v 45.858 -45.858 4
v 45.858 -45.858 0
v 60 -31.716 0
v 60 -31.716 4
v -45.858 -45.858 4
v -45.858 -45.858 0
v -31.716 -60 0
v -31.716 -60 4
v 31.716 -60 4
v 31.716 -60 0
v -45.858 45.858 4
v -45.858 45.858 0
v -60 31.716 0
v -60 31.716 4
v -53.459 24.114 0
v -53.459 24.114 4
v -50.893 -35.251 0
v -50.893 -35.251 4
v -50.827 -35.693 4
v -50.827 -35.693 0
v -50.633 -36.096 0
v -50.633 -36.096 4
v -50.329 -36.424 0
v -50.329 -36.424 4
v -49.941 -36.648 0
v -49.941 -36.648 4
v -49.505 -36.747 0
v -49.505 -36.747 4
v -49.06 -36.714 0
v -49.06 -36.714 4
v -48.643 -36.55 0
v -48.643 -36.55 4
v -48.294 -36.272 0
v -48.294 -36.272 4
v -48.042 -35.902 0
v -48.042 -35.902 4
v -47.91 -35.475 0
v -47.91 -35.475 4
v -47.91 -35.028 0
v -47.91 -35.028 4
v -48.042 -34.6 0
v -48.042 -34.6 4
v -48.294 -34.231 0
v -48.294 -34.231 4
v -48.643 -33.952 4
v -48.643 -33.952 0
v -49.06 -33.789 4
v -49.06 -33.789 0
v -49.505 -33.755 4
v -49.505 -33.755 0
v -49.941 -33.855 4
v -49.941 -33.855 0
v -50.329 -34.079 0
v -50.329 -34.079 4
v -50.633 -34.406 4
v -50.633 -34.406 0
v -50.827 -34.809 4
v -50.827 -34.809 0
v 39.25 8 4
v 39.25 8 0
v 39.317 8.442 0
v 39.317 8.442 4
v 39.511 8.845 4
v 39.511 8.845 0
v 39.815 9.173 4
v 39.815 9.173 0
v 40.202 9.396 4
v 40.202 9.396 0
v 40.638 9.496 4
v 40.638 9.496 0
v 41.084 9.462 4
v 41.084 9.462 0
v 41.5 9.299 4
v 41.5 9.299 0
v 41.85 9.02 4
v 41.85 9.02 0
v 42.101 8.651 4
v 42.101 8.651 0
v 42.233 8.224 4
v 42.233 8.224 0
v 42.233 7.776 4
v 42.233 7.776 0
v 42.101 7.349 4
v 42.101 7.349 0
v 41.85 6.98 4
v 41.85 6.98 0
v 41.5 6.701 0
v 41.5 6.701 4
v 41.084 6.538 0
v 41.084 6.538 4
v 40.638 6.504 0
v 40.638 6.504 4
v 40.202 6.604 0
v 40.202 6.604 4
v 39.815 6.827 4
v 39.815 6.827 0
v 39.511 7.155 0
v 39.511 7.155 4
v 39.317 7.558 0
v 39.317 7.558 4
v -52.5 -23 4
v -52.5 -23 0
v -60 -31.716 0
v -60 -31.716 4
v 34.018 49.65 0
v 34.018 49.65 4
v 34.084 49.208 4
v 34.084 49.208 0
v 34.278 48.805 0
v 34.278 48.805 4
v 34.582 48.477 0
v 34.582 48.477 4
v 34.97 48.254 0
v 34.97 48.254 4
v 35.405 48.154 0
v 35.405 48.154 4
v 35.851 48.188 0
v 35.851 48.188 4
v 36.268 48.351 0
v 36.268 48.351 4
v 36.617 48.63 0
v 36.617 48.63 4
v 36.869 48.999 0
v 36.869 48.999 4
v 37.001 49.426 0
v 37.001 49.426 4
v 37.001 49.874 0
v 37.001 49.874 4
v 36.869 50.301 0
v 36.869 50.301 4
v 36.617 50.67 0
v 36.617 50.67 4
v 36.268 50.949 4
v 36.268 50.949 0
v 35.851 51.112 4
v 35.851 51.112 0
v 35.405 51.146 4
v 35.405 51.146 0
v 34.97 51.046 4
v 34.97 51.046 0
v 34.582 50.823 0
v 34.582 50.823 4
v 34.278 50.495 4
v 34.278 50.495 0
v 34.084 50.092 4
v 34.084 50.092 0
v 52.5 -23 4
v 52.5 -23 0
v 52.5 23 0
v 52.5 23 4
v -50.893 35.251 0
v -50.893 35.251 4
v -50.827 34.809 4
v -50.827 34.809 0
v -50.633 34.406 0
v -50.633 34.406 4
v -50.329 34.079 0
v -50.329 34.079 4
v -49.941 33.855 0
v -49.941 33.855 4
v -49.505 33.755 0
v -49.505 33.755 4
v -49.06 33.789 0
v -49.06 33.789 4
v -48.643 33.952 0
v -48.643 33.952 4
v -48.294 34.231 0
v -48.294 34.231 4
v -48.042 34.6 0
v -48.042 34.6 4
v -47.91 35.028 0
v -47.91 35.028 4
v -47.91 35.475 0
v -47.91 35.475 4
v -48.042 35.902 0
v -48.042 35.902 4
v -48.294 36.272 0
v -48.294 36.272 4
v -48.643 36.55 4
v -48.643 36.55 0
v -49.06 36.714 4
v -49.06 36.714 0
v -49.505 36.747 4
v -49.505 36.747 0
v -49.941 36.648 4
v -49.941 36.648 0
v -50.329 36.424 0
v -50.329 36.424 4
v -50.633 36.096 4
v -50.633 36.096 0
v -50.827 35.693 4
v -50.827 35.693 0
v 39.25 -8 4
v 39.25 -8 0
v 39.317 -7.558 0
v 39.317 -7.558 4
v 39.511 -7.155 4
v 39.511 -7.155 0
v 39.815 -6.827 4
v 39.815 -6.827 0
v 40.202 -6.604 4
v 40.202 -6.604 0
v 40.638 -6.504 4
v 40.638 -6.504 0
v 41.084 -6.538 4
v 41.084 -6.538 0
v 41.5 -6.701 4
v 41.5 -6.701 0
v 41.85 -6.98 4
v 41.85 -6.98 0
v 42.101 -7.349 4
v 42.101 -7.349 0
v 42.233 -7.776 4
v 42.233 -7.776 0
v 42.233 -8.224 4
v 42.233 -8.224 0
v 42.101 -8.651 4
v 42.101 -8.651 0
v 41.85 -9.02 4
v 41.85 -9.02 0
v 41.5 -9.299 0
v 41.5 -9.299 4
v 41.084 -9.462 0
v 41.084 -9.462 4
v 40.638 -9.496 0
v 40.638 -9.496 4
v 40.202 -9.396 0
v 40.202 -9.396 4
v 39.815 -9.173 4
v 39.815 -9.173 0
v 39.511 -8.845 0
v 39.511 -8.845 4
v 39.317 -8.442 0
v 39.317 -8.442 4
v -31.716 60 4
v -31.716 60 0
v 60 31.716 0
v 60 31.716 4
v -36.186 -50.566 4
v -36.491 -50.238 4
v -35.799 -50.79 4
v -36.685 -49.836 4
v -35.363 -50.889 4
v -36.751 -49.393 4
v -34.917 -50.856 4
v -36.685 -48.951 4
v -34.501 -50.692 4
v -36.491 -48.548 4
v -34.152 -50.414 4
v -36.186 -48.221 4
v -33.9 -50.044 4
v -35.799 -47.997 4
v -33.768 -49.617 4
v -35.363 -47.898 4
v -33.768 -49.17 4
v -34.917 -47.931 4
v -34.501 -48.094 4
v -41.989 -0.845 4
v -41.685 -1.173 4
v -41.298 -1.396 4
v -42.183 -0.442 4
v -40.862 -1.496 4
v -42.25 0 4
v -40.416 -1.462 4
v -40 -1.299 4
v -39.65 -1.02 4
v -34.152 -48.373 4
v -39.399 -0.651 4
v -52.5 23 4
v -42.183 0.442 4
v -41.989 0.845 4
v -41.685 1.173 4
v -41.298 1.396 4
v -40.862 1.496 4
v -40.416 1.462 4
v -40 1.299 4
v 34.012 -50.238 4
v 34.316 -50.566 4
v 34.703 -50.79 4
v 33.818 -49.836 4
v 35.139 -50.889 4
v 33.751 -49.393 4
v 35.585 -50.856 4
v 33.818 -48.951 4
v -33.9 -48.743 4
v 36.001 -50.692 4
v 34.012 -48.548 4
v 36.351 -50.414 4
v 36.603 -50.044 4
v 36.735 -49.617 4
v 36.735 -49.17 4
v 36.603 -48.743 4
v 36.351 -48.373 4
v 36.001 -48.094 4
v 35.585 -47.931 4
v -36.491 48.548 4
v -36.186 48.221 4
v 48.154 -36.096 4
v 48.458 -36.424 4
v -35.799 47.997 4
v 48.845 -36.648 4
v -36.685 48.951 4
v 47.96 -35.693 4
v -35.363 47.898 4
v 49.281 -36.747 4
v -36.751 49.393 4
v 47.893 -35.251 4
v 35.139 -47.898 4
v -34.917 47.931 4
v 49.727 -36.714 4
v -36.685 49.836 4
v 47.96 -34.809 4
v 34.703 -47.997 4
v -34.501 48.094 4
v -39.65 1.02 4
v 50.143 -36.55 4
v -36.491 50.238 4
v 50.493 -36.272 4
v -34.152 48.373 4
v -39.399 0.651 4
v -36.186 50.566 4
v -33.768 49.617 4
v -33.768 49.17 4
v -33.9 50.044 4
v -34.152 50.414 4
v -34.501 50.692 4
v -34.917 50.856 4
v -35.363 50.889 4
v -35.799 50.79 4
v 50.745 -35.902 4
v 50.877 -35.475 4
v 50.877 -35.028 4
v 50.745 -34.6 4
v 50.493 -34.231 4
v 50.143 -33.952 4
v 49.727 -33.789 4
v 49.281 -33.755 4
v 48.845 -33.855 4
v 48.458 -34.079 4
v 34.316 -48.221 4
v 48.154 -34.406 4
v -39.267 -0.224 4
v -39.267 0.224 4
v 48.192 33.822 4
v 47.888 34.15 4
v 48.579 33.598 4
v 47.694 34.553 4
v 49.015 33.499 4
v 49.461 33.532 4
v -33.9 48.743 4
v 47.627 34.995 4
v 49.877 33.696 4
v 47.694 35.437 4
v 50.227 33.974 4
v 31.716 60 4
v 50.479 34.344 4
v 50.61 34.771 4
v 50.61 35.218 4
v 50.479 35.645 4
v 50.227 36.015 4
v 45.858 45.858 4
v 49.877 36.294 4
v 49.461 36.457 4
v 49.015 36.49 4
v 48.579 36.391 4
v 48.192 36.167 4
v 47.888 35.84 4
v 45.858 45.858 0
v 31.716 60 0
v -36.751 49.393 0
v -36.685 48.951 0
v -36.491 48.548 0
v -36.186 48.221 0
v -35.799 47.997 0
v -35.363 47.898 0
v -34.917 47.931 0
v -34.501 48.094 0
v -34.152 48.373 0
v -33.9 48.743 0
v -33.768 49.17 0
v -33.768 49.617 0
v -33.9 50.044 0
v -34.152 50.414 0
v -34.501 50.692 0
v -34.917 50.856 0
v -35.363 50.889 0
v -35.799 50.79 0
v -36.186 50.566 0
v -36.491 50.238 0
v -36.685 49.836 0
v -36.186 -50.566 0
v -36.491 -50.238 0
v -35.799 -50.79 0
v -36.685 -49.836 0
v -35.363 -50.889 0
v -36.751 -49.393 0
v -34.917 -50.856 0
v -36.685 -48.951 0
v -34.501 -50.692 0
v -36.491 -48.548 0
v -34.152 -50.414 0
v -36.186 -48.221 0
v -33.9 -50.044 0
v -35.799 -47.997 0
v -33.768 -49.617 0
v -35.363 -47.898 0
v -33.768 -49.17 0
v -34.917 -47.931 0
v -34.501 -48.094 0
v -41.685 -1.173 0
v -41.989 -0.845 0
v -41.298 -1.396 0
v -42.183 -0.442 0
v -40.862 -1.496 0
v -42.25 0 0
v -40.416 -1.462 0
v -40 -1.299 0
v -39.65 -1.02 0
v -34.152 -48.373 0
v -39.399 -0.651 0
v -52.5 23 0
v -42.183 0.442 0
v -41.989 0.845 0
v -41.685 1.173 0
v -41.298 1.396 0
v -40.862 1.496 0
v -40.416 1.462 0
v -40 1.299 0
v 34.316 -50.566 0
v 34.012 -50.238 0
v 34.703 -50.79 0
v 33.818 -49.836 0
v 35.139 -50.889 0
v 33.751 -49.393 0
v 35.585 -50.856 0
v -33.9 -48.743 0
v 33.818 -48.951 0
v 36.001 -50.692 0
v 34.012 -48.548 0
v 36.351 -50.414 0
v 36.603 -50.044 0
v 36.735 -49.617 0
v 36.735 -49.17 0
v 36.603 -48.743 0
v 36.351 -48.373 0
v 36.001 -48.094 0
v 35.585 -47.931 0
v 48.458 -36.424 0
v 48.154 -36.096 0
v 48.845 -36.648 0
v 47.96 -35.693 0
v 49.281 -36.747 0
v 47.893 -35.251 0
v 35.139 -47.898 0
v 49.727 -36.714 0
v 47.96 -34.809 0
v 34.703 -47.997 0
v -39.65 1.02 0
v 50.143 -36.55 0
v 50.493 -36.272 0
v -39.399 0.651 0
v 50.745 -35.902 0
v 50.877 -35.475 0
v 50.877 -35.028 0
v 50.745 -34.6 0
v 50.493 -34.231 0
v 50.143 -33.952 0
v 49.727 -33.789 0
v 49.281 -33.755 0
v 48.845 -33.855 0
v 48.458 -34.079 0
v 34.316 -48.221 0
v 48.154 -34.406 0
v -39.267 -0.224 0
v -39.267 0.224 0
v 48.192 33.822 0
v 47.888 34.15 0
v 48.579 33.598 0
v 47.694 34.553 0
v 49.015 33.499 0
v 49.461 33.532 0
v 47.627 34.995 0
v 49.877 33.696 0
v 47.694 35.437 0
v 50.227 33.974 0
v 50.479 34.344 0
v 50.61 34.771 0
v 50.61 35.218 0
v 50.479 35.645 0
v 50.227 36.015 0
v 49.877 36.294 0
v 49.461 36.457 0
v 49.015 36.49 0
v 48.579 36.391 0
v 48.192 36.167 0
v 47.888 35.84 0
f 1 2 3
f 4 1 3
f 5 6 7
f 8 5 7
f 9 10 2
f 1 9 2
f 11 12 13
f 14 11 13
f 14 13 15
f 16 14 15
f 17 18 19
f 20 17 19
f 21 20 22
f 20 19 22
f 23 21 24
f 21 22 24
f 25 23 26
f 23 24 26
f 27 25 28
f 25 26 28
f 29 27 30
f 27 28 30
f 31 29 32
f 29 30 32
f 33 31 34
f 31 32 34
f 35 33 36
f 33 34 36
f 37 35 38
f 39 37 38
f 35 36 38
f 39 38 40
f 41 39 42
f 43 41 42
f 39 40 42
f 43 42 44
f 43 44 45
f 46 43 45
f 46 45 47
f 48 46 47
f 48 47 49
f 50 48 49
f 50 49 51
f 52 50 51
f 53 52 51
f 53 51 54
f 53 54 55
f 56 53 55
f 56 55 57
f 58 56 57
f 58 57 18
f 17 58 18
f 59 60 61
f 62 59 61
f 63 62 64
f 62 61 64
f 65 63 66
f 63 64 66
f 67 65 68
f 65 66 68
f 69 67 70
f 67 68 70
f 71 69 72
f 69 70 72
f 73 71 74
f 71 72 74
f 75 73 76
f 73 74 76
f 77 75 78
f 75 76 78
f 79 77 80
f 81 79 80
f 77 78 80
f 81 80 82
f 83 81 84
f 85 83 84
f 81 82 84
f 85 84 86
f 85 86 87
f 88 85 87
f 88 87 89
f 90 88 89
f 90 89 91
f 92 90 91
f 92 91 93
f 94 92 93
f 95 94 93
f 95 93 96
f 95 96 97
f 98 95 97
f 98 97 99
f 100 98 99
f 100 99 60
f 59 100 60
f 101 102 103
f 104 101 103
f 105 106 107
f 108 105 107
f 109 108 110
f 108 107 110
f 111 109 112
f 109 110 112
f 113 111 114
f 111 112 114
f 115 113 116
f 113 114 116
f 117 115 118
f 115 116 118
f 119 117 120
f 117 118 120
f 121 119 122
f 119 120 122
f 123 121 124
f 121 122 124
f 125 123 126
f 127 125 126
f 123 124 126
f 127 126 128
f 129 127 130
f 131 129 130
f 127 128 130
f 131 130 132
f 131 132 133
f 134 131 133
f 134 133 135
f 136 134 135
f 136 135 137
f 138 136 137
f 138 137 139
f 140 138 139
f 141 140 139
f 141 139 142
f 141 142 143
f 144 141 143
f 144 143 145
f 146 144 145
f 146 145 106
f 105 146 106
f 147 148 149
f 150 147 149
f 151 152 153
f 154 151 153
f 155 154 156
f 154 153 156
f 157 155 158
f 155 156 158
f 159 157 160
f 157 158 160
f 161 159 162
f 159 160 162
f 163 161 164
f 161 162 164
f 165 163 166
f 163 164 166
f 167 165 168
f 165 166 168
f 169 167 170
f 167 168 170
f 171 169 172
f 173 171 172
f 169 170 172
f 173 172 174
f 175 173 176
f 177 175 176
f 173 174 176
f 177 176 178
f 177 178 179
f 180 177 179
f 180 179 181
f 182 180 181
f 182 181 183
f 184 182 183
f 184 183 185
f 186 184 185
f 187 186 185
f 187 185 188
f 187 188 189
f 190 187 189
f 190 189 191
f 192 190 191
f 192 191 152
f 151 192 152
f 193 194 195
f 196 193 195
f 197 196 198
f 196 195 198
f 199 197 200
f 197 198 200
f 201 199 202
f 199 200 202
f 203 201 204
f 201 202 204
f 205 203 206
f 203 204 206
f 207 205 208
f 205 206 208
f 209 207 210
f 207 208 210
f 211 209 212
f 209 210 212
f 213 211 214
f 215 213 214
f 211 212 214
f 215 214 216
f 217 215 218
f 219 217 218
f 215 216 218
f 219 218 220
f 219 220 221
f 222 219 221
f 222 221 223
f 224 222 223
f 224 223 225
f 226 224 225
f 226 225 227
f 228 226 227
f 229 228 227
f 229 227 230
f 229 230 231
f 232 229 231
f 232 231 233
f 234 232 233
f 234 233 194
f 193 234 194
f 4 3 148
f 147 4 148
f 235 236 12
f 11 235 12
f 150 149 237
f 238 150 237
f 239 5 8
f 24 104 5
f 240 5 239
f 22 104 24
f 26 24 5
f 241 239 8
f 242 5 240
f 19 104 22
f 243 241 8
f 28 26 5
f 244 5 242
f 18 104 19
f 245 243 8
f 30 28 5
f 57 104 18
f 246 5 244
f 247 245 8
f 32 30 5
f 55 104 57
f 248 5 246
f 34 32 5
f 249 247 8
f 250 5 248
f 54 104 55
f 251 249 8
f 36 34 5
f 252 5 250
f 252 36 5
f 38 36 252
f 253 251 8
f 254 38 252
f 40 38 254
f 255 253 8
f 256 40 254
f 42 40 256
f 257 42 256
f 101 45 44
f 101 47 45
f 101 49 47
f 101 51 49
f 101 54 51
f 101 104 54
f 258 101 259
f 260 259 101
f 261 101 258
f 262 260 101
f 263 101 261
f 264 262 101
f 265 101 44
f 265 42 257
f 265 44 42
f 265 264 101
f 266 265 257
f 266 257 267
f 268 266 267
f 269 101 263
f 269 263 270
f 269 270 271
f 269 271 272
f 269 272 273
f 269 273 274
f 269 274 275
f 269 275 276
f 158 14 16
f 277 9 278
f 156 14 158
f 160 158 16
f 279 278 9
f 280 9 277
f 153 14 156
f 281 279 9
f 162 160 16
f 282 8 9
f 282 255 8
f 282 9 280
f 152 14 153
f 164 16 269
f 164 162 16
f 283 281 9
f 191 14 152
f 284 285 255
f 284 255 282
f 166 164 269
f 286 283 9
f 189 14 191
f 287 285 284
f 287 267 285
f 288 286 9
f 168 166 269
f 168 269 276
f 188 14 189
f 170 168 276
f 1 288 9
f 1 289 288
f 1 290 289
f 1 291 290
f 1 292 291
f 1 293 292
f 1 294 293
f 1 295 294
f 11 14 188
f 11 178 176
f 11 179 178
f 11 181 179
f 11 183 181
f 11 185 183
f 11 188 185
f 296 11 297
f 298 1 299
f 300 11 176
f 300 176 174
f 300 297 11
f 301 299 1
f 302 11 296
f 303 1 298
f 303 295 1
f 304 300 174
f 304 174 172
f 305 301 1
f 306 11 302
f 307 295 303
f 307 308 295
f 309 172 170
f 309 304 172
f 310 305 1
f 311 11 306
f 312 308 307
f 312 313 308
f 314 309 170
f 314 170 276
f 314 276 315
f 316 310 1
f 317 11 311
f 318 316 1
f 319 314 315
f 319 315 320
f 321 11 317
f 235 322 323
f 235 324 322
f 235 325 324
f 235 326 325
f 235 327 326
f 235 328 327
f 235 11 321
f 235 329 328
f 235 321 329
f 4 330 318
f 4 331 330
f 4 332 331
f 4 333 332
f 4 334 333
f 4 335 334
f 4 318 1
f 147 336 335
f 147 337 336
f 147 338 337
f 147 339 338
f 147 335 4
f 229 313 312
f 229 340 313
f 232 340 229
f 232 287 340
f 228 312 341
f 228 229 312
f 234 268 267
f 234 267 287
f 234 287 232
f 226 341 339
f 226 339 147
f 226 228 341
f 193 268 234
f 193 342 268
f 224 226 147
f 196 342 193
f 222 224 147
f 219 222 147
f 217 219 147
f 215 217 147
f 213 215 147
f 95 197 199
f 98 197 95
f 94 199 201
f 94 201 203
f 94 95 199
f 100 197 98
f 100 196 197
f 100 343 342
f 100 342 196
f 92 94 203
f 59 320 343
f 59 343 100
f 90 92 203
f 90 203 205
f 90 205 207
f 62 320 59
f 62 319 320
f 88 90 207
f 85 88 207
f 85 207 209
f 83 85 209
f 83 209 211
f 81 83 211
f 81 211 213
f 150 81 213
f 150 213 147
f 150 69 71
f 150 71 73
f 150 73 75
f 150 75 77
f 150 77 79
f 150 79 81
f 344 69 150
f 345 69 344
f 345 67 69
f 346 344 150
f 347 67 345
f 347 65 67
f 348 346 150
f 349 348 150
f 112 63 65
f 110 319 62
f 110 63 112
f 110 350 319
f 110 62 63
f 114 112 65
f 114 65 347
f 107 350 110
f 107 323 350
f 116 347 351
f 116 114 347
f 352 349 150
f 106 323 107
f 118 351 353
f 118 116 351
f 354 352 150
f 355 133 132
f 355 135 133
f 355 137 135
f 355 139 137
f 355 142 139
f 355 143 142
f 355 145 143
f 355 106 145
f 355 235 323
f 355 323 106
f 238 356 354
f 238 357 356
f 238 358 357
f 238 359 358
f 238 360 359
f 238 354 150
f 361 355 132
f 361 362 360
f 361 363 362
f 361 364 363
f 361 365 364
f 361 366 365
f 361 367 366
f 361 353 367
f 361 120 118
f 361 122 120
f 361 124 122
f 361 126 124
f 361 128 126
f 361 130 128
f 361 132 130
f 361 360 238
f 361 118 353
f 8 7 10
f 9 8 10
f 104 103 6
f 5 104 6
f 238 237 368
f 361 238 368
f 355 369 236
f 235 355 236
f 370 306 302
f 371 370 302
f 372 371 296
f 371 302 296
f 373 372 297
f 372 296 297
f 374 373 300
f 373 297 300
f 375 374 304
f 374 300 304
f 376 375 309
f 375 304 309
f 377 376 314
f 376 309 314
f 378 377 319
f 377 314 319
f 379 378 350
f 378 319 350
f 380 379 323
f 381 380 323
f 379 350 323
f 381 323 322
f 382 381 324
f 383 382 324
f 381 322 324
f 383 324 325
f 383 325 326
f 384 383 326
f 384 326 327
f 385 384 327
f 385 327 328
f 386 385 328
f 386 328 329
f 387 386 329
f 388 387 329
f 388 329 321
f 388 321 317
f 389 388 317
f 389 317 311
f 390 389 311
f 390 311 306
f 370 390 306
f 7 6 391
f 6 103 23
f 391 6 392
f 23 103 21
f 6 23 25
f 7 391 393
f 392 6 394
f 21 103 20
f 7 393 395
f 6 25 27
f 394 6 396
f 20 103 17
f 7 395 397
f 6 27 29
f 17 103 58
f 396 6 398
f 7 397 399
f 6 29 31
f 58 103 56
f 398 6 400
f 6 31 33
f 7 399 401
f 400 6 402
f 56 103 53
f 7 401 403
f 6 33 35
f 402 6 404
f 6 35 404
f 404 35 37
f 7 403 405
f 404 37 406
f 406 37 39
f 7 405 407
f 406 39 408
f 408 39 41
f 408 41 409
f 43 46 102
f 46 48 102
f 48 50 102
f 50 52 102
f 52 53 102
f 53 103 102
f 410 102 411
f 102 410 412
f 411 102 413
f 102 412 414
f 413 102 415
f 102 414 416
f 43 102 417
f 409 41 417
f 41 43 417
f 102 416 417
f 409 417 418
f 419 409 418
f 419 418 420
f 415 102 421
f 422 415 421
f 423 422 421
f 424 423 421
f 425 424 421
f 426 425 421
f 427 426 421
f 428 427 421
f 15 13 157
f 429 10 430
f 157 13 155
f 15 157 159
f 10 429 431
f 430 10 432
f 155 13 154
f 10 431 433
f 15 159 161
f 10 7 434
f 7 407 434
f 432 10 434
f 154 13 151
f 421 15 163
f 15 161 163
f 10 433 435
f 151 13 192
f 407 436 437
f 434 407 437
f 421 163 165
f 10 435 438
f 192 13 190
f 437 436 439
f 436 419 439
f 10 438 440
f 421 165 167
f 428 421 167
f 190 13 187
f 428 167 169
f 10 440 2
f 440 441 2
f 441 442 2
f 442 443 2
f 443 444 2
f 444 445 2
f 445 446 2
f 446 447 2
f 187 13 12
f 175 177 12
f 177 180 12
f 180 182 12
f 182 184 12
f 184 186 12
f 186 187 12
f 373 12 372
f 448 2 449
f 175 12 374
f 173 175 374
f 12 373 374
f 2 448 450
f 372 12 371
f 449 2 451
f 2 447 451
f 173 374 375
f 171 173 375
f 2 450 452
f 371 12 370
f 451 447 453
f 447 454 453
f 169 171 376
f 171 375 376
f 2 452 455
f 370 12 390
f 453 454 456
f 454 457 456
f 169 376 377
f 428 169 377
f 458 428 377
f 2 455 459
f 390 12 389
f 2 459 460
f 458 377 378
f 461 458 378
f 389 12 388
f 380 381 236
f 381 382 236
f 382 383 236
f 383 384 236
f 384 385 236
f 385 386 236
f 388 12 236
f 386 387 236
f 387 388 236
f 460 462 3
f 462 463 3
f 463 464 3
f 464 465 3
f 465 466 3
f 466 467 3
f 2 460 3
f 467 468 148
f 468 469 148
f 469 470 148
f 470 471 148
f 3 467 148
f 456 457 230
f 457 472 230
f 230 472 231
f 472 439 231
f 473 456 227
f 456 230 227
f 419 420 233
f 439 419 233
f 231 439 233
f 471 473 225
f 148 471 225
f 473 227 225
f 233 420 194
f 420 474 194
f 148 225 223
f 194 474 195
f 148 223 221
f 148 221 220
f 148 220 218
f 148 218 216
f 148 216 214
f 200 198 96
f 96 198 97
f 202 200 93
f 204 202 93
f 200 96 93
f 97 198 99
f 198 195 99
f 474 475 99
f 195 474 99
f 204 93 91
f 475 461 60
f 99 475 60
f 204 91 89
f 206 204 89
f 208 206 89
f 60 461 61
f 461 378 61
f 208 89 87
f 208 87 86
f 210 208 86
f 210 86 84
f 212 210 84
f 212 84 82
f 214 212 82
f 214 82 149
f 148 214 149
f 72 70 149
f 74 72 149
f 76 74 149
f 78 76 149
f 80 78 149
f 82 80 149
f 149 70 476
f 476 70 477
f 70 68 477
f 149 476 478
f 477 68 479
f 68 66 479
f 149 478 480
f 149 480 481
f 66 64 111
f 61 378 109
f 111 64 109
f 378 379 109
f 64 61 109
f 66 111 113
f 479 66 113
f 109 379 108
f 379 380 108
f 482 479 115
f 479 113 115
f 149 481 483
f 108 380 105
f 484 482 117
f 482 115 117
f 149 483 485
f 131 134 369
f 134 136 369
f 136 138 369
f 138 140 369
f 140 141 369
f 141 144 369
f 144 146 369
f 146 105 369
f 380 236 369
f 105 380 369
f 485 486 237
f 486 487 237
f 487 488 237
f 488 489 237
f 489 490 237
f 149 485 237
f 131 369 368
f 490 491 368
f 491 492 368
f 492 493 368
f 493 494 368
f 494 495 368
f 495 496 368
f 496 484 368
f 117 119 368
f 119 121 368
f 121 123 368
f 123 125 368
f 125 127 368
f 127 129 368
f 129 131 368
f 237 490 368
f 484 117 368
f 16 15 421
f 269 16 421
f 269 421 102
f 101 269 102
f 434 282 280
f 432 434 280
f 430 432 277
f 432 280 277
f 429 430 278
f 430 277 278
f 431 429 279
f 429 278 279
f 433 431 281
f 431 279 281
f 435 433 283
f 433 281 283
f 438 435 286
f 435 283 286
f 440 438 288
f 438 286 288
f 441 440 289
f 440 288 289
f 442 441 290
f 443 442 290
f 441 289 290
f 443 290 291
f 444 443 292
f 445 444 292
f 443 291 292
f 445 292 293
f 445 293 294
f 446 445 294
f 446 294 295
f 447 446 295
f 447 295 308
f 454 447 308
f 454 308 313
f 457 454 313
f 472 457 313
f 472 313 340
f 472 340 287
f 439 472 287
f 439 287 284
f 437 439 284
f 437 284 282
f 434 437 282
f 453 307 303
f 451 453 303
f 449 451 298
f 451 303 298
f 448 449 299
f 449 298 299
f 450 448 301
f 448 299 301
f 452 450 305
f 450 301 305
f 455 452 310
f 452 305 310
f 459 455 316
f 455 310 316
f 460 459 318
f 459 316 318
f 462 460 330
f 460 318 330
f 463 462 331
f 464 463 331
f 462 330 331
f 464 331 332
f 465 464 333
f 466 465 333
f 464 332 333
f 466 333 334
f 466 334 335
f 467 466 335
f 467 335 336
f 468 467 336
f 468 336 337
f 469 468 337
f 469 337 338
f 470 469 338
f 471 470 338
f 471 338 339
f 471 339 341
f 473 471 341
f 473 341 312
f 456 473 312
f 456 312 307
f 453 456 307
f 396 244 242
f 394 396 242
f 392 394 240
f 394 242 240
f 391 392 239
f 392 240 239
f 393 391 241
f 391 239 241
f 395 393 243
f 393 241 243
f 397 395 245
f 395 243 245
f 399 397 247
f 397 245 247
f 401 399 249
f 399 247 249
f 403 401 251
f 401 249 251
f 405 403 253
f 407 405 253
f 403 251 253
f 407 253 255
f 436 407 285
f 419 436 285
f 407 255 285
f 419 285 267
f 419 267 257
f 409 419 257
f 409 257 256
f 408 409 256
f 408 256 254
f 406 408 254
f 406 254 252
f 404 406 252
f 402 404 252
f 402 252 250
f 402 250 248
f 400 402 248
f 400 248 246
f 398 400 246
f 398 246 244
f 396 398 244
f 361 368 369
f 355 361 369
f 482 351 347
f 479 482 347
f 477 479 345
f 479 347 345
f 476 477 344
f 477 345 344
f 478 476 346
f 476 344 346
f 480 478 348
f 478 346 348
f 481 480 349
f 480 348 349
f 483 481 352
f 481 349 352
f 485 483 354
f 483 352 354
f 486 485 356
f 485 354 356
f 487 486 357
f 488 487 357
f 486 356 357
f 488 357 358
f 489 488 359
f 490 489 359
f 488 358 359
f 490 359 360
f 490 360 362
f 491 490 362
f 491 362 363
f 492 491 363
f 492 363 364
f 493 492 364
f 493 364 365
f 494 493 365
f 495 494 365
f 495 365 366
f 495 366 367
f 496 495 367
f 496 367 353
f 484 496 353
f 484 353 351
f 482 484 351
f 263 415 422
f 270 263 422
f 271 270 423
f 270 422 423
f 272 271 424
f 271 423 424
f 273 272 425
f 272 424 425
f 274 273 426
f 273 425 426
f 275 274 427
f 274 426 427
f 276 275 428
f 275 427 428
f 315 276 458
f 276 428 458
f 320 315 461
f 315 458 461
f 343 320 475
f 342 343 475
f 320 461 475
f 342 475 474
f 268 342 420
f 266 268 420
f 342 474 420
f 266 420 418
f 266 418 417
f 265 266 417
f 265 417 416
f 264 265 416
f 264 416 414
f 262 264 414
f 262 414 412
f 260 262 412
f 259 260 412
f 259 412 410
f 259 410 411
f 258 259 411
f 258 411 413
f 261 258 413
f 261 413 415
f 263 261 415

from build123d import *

# Parameters (mm, degrees)
F5_DEPTH = 4
F7_D     = 3
F8_D     = 3


with BuildPart() as f5:
    # F4 (on Top) → F5 (new body)
    with BuildSketch(Plane.XY):
        Polygon((31.7157287525, 60), (-31.7157287525, 60), (-45.8578643763, 45.8578643763), (-60, 31.7157287525), (-53.459262274, 24.1143308548), (-52.5, 22.9995125363), (-52.5, -22.9995125363), (-60, -31.7157287525), (-45.8578643763, -45.8578643763), (-31.7157287525, -60), (31.7157287525, -60), (45.8578643763, -45.8578643763), (60, -31.7157287525), (52.5, -22.9995125363), (52.5, 22.9995125363), (60, 31.7157287525), (45.8578643763, 45.8578643763), align=None)
    extrude(amount=F5_DEPTH)

    # F7 (through all)
    with Locations(Plane.XY.offset(4)):
        with Locations((-40.75, 0), (40.75, -8), (40.75, 8)):
            Hole(F7_D / 2)

    # F8 (through all)
    with Locations(Plane(origin=(0, 0, 0), x_dir=(1, 0, 0), z_dir=(0, 0, -1))):
        with Locations((-49.3933982822, -35.2512626585), (-35.2512626585, -49.3933982822), (35.5175525155, -49.6500174851), (49.1271084251, -34.9946434556), (49.3933982822, 35.2512626585), (35.2512626585, 49.3933982822), (-35.2512626585, 49.3933982822), (-49.3933982822, 35.2512626585)):
            Hole(F8_D / 2)


solid = f5.part
